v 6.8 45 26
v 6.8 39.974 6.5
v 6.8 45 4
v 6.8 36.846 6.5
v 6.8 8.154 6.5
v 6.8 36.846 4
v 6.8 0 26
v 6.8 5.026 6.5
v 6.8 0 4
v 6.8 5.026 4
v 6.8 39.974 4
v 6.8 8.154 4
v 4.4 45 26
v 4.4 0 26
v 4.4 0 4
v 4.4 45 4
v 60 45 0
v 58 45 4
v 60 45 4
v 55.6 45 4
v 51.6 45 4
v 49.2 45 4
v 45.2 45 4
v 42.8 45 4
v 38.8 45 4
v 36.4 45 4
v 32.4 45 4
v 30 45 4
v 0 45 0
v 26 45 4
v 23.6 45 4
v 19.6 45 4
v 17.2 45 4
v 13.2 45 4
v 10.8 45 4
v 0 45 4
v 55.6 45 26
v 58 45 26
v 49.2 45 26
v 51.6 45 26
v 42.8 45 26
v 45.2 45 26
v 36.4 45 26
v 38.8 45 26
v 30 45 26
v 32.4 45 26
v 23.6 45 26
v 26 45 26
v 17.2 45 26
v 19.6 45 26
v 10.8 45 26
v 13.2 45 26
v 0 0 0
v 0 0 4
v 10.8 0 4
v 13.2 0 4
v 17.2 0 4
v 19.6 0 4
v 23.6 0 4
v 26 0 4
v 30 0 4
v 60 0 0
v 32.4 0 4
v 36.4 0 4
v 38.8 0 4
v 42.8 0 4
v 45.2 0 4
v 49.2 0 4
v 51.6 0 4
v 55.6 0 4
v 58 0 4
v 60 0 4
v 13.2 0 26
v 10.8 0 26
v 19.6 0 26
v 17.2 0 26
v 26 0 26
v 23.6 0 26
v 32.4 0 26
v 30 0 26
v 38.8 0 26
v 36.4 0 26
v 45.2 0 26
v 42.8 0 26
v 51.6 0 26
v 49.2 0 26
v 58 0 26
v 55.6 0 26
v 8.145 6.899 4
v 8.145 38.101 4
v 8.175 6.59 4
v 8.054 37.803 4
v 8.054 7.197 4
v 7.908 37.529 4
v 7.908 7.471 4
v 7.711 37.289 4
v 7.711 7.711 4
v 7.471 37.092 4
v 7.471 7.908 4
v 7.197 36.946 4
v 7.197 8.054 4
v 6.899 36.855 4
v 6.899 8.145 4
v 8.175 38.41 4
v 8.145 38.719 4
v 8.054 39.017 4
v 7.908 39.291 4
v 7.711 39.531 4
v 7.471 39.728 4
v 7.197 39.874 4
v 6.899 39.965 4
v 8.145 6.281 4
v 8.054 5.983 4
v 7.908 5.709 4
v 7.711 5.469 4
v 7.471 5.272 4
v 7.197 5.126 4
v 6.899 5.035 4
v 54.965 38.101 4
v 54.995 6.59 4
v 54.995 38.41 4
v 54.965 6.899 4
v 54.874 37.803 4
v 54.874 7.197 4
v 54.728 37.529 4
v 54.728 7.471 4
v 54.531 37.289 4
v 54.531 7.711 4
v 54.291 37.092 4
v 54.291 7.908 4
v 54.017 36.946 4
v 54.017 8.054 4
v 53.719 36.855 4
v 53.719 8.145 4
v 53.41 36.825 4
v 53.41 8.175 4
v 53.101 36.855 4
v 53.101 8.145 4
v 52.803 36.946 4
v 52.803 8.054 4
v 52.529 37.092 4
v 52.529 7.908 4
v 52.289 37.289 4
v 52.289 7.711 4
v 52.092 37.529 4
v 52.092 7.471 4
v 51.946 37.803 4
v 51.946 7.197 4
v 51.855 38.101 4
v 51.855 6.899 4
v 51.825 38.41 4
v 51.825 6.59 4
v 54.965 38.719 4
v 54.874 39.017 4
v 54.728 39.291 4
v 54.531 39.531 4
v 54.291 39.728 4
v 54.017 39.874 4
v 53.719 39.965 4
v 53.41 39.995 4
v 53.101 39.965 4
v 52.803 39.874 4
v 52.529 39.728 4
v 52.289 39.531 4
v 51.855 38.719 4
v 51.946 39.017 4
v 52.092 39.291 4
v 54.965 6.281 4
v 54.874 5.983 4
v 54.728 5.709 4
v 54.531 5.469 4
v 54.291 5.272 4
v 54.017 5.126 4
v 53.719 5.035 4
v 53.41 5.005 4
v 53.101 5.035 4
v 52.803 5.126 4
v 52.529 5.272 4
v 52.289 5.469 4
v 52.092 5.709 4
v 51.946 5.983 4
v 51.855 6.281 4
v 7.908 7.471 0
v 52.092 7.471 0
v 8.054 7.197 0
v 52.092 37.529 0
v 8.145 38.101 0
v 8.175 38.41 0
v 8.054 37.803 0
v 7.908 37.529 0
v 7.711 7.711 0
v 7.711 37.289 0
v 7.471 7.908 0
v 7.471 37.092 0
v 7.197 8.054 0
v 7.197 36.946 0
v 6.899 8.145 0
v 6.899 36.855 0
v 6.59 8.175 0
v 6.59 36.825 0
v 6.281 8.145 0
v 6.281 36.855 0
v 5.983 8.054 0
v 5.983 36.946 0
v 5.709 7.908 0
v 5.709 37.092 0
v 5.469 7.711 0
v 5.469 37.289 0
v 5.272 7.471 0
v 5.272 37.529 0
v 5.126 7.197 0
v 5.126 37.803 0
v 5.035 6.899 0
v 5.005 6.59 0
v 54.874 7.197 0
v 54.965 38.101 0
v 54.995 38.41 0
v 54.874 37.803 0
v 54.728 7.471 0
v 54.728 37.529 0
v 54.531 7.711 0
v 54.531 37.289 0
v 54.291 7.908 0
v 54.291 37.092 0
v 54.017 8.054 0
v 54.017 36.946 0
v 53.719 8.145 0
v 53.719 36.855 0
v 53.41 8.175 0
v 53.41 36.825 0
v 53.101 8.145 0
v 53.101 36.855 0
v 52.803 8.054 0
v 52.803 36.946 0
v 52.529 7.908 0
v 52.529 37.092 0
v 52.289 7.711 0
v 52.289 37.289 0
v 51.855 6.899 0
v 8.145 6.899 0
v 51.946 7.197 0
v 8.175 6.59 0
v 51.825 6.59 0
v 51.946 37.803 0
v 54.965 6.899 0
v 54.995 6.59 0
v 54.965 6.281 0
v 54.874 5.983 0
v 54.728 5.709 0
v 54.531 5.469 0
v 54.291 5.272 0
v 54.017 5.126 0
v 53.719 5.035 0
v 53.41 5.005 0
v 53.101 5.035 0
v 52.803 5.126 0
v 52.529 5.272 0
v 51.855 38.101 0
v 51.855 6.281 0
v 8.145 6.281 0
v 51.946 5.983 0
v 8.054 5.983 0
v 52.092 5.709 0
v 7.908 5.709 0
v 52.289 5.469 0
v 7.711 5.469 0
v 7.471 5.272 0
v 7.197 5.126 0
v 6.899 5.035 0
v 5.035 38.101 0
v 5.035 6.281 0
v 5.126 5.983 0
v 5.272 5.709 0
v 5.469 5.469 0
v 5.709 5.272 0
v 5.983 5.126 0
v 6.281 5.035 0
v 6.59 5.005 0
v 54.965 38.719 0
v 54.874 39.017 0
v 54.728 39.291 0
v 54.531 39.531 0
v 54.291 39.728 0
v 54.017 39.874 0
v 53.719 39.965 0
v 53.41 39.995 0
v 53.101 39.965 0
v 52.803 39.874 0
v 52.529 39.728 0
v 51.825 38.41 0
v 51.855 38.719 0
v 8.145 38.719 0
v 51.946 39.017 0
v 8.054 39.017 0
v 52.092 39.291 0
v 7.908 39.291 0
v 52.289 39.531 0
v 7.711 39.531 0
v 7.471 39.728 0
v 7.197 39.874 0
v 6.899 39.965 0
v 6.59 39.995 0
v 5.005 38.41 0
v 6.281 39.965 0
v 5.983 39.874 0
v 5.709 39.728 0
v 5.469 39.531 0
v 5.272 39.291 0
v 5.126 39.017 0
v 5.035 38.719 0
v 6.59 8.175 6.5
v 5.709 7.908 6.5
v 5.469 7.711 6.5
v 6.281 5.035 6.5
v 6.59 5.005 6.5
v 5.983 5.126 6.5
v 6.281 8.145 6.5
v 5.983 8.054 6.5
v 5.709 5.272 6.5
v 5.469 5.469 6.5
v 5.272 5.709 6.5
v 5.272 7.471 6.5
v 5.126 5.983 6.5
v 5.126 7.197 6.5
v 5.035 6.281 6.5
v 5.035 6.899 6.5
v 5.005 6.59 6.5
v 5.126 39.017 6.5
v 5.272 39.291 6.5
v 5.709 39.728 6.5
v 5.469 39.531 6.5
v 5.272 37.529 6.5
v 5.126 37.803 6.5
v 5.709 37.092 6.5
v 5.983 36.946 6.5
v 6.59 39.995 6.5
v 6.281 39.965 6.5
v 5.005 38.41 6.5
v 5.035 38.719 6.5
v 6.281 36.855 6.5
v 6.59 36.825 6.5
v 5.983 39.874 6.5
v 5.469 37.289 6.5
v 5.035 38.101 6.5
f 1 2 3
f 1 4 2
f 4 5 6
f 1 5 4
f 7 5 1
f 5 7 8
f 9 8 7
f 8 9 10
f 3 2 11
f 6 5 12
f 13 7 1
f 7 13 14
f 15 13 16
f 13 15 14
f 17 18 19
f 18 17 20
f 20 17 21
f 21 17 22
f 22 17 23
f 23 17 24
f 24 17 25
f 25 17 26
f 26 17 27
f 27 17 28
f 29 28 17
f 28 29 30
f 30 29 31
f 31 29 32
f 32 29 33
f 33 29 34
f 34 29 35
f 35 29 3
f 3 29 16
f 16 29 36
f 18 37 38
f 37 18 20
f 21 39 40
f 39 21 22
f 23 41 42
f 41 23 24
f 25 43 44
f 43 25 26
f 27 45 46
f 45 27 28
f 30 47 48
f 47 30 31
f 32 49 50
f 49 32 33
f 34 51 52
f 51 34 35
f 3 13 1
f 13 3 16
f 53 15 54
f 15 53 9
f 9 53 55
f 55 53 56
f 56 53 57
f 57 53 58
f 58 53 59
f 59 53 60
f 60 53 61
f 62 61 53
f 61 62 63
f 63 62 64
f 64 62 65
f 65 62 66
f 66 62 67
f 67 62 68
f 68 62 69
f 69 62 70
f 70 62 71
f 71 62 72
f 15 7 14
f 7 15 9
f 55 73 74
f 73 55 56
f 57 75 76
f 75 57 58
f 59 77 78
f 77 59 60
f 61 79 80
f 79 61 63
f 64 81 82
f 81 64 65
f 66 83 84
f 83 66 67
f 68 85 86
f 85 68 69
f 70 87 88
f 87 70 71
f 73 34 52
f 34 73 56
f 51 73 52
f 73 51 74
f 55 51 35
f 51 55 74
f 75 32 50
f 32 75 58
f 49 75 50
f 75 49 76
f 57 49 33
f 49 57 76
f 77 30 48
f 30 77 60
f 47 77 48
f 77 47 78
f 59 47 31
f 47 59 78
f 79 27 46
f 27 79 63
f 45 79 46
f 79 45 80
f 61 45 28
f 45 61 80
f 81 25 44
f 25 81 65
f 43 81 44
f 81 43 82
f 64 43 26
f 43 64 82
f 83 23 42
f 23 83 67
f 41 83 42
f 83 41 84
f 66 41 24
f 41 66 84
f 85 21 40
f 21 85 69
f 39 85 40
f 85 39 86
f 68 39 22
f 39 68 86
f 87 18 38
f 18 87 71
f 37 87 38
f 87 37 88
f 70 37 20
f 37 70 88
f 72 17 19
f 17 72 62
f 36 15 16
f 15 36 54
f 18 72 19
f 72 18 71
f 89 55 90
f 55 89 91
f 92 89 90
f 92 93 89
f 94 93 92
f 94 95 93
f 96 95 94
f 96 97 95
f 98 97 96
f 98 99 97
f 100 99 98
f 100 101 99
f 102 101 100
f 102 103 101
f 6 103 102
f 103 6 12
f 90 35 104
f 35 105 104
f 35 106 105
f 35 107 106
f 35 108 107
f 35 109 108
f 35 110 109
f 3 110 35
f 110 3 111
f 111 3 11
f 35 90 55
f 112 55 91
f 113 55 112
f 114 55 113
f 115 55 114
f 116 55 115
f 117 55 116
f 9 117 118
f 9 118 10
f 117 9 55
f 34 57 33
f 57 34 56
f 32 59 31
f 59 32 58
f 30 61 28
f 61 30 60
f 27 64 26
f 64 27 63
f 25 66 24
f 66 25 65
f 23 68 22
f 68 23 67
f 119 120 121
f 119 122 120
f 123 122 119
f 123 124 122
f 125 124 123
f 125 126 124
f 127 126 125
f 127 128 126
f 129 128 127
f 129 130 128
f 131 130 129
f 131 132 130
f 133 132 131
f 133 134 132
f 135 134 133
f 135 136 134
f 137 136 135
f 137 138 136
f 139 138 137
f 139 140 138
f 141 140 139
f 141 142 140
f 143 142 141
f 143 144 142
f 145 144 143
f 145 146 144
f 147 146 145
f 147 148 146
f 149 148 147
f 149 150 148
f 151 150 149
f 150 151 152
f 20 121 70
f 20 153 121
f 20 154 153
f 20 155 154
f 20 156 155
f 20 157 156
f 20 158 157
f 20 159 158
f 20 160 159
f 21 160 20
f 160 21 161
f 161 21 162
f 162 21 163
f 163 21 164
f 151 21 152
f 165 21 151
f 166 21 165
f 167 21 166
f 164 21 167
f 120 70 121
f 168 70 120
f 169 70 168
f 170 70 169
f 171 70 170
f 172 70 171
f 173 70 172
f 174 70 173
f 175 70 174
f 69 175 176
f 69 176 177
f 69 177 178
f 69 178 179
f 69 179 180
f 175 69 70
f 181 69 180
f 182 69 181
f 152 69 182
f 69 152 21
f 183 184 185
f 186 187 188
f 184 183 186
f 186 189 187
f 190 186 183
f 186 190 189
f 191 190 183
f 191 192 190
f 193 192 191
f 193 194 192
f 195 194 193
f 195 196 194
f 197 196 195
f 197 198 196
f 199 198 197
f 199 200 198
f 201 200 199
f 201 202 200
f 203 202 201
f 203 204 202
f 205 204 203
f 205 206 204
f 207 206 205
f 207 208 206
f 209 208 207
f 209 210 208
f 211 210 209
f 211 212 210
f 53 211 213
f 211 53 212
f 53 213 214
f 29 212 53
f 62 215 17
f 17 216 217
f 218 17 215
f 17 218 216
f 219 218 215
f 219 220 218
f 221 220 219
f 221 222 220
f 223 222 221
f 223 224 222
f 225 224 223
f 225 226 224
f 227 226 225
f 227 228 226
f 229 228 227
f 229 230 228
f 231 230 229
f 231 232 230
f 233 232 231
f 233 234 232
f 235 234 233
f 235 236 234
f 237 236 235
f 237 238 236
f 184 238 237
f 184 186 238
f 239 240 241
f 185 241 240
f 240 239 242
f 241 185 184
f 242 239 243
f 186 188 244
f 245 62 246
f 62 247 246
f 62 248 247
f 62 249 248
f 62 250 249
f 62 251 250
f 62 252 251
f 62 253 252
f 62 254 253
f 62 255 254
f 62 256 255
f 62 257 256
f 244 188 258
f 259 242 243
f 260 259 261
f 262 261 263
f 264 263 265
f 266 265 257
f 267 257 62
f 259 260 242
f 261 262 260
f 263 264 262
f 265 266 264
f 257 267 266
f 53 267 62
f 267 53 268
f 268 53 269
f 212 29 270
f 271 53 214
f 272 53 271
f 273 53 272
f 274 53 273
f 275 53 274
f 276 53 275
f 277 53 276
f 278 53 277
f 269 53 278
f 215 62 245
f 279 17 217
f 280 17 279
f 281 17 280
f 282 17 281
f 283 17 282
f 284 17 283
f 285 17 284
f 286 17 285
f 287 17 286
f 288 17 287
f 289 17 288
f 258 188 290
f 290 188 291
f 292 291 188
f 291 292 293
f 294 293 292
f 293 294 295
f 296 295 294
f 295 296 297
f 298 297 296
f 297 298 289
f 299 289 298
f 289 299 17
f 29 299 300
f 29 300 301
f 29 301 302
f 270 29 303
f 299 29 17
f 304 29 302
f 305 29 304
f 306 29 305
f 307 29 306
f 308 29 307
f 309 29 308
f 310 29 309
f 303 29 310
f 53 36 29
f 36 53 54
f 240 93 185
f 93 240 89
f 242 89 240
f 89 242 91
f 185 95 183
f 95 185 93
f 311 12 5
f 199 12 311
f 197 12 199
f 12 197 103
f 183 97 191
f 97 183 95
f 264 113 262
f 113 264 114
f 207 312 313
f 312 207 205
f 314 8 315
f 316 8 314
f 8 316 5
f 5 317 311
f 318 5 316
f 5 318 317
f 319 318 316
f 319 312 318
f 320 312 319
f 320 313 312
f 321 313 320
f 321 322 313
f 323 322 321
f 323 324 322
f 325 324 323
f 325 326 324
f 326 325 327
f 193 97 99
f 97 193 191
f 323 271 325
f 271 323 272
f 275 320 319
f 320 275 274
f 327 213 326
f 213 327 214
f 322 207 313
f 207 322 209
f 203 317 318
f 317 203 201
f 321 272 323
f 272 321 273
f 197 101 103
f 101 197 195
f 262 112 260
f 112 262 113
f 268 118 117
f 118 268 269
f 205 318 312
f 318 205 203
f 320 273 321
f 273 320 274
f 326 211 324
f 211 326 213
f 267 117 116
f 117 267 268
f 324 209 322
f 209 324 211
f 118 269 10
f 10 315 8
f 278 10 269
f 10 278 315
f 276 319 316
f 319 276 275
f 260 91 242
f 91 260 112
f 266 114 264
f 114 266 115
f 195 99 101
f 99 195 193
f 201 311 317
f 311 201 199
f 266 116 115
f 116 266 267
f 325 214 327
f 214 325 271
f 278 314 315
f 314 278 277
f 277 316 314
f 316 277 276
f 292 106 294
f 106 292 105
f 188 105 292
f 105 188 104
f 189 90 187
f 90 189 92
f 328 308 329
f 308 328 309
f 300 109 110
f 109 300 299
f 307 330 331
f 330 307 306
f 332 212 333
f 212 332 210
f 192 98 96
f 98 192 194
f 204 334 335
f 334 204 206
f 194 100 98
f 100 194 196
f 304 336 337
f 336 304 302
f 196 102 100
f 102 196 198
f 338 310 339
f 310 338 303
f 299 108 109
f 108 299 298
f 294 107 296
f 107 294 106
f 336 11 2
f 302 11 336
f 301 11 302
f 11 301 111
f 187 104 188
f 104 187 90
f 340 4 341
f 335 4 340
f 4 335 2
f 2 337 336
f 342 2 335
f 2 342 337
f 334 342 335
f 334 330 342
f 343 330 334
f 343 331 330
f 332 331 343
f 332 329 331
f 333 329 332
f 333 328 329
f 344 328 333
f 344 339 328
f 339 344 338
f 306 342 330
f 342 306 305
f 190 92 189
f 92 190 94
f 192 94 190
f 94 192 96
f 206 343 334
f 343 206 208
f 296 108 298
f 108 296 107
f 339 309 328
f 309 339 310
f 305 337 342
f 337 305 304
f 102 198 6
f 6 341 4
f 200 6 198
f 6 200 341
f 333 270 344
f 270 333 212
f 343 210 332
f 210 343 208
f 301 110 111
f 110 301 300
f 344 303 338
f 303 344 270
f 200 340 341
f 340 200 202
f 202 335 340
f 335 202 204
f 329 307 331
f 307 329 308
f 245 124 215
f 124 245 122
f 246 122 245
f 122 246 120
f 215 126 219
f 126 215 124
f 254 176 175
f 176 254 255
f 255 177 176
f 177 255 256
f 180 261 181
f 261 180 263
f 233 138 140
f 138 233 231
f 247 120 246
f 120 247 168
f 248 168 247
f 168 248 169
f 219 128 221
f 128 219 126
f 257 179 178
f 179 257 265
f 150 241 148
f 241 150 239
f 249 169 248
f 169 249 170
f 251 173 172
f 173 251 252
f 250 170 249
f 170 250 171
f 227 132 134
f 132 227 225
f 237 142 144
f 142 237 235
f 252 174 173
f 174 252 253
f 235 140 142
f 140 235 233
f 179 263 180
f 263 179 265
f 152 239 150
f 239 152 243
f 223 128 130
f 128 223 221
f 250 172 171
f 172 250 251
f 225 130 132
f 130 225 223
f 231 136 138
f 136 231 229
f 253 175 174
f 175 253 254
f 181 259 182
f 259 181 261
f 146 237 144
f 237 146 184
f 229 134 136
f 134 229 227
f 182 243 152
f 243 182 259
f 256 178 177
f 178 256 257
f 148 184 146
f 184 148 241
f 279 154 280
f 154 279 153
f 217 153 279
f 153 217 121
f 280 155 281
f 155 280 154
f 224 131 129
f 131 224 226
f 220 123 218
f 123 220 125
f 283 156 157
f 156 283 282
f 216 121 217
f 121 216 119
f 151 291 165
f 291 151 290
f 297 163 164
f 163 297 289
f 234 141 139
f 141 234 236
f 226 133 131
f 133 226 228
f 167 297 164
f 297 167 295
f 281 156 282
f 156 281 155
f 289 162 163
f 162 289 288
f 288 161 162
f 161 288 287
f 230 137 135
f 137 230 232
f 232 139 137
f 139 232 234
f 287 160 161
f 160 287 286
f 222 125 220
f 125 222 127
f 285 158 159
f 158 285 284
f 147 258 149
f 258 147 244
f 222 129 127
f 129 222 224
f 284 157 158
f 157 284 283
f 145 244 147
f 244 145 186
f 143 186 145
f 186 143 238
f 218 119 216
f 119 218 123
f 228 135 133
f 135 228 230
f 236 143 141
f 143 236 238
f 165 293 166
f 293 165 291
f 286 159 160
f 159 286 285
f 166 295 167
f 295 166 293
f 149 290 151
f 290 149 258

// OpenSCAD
$fn = 32;

// ----------------------------------------------------------------------
// Finned heat sink: 60 x 45 mm base, 22 mm fins
// ----------------------------------------------------------------------

// --- parameters (mm) ---
base_w = 60;              // base width
base_d = 45;              // base depth
base_t = 4;               // base thickness
fin_h = 22;               // fin height above the base
holes_d = 3.17;           // fixing holes
hole_x = 23.41;           // hole offset in x
hole_y = 15.91;           // hole offset in y
fin_t = 2.4;              // fin thickness
fin_pitch = 6.4;          // fin pitch
fin_count = 9;            // number of fins
fin_x0 = 4.4;             // first fin offset

difference() {
  union() {
    cube([base_w, base_d, base_t]);
    for (i = [0 : fin_count - 1]) {
      translate([fin_x0 + i * fin_pitch, 0, base_t - 0.5]) cube([fin_t, base_d, fin_h + 0.5]);
    }
  }
  /* fixing holes through the base, 2.5 mm clear on both sides */
  for (hx = [-23.41, 23.41]) {
    for (hy = [-15.91, 15.91]) {
      translate([base_w / 2 + hx, base_d / 2 + hy, -2.5]) cylinder(h = base_t + 5, d = holes_d);
    }
  }
}
